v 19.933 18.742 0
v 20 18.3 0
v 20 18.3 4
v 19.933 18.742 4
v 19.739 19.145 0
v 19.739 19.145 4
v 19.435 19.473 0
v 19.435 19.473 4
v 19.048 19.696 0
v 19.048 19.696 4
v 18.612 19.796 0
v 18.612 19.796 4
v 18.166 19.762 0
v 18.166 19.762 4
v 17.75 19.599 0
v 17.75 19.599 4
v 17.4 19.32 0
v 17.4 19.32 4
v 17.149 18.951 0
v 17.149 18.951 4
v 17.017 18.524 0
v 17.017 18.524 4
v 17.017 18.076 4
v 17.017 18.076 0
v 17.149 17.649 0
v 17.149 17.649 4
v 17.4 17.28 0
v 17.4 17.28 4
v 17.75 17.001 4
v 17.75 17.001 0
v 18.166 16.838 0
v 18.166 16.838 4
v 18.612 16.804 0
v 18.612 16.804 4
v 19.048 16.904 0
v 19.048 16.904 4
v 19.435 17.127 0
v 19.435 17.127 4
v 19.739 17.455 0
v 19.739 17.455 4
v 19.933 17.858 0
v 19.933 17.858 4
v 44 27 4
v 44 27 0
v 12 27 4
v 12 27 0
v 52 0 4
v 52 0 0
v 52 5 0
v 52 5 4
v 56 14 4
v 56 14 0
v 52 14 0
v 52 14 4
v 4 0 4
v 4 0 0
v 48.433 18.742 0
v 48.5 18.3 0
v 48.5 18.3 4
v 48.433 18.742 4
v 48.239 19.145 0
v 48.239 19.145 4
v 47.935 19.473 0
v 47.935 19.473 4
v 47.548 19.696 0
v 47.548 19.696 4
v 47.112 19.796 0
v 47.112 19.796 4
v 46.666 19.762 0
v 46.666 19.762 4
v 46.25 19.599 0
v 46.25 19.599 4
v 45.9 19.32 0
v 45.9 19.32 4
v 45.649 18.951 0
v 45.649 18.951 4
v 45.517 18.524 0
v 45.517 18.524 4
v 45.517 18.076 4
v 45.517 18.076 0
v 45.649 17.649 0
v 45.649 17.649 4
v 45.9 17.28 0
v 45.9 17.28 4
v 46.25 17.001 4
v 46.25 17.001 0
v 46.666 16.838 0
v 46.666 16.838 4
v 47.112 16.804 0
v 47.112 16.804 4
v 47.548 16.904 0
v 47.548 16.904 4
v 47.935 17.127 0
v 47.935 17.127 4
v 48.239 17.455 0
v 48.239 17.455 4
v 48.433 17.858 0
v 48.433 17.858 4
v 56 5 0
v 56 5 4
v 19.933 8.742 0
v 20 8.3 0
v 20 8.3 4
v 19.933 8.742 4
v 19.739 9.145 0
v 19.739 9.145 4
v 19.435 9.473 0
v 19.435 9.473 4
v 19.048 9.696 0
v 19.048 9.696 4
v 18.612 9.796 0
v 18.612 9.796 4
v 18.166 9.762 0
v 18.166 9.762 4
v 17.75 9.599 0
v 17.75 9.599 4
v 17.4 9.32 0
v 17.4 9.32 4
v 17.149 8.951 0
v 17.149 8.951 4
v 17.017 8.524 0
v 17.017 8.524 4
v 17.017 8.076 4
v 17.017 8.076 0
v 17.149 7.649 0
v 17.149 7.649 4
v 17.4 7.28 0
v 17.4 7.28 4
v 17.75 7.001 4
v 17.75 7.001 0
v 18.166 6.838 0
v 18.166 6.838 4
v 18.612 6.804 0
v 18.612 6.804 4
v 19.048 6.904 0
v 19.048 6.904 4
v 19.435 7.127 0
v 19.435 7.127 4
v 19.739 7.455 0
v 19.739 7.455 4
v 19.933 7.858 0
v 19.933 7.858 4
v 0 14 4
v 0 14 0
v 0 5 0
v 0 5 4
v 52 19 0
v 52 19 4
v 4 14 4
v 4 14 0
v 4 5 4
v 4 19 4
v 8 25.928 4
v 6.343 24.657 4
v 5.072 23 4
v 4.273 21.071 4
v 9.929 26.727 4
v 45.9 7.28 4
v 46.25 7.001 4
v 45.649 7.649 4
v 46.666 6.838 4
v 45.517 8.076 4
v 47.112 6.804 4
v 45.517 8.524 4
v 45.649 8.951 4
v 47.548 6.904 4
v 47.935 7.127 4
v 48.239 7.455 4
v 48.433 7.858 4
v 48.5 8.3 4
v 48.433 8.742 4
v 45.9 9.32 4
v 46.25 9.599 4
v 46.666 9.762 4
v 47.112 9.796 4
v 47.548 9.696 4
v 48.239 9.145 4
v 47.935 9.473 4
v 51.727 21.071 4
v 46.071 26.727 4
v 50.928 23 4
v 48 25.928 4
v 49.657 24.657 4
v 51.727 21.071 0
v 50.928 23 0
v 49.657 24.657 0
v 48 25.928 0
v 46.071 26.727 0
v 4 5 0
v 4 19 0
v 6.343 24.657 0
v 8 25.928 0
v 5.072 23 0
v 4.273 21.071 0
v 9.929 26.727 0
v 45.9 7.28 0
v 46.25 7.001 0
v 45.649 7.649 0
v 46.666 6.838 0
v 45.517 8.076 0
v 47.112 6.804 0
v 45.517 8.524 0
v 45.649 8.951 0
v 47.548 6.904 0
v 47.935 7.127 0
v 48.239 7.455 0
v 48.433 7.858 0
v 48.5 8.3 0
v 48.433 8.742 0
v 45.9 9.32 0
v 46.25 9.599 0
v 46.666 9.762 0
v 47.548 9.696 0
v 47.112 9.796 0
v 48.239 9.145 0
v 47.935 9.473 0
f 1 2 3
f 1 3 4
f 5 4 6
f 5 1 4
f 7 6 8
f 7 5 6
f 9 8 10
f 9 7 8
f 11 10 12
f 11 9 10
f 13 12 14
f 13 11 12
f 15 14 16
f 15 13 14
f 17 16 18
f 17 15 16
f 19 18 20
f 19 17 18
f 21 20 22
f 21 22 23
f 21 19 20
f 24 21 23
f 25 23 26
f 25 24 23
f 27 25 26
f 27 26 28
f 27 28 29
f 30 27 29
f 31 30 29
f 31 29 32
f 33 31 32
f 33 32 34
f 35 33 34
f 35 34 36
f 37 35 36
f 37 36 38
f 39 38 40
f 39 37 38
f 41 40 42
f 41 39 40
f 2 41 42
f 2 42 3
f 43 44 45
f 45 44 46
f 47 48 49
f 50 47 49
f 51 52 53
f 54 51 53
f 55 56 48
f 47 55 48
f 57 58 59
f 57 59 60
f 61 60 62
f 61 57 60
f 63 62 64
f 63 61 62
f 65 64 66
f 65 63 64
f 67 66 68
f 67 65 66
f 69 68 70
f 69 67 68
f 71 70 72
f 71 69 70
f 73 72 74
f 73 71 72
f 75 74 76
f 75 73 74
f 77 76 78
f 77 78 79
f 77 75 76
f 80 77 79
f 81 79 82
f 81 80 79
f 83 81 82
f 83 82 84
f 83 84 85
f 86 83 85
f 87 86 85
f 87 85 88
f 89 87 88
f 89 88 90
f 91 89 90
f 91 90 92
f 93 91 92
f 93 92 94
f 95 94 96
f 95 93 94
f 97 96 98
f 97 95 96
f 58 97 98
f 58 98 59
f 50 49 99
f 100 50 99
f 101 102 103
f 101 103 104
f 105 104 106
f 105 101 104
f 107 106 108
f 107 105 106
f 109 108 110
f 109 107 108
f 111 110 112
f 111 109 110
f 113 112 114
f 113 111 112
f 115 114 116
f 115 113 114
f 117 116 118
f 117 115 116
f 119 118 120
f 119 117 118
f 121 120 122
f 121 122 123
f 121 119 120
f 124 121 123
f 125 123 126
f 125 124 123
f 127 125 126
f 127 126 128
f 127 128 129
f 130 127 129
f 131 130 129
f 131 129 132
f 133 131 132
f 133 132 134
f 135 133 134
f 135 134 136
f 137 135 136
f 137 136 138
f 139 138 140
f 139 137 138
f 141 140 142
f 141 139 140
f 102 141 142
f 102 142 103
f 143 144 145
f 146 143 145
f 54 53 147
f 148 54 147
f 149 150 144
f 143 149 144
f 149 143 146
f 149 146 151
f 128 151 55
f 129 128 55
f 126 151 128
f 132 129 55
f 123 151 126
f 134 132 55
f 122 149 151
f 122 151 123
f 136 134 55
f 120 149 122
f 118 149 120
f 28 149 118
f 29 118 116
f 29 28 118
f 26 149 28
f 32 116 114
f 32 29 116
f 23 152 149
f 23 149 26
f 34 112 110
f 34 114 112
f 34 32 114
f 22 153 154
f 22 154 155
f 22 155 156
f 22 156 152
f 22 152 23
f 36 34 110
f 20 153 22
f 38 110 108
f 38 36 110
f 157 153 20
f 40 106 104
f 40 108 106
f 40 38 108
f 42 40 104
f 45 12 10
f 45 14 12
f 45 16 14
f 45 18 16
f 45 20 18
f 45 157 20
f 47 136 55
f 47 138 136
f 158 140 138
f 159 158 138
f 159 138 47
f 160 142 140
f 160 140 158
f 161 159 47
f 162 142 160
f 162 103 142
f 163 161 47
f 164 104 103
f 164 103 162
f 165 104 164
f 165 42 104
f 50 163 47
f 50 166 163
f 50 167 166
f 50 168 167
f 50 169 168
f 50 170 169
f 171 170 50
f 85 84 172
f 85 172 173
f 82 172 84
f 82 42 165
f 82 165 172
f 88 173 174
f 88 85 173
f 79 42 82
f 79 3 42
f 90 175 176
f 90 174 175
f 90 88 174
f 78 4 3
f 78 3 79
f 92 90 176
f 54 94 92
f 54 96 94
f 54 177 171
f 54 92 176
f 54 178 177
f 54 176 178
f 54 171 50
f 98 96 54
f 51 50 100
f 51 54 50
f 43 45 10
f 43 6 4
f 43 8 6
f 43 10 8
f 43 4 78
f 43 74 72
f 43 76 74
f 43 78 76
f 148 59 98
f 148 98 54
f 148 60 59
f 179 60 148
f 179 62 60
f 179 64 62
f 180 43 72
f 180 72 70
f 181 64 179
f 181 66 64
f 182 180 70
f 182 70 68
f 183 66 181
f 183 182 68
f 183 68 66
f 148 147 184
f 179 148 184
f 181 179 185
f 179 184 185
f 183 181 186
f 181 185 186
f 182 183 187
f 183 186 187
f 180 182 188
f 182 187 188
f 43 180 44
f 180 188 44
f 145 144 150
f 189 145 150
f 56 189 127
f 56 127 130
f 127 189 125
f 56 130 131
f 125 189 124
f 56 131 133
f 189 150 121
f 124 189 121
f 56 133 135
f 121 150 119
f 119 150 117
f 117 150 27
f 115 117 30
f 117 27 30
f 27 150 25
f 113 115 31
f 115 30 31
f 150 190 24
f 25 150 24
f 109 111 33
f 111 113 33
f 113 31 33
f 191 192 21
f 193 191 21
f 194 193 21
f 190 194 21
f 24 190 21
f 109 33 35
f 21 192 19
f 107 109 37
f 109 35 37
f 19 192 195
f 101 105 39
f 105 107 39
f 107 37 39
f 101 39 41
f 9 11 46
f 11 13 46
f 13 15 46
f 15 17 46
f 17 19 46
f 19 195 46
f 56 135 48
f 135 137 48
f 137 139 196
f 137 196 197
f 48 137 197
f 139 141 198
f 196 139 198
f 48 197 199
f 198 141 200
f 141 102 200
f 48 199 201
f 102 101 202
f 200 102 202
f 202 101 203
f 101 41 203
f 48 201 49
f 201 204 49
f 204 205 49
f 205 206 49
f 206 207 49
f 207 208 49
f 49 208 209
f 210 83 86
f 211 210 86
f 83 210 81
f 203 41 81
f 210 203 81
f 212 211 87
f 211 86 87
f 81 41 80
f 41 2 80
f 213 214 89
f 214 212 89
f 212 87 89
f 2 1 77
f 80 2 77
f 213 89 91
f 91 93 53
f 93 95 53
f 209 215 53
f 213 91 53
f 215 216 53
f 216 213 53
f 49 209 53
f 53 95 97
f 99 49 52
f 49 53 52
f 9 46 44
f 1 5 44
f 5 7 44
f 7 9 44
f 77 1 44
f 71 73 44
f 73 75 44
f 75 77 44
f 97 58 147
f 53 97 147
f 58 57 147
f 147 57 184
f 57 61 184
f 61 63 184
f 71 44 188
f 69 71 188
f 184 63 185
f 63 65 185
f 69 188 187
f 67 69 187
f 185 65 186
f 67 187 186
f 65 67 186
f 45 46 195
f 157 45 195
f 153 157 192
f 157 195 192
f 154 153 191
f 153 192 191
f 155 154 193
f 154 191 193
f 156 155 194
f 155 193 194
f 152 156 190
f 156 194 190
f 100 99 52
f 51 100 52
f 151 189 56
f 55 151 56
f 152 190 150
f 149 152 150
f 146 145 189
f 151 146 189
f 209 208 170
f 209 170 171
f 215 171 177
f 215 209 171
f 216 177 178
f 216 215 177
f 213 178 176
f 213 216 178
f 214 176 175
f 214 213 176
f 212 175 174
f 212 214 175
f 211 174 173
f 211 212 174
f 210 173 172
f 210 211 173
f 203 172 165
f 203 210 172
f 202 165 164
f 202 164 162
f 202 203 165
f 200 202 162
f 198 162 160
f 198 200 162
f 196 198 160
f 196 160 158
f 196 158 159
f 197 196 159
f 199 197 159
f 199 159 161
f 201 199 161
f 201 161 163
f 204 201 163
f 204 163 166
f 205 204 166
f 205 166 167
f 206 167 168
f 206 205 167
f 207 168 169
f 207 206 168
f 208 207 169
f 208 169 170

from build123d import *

# Parameters (mm, degrees)
SKETCH1_R           = 1.5
BOSS_EXTRUDE1_DEPTH = 4


with BuildPart() as part:
    # Sketch1 → Boss-Extrude1 (new body)
    with BuildSketch(Plane.XY):
        with BuildLine():
            Line((3.999999567, 13.999999851), (-4.33e-07, 13.999999851))
            Line((-4.33e-07, 13.999999851), (-4.33e-07, 4.999999851))
            Line((-4.33e-07, 4.999999851), (3.999999567, 4.999999851))
            Line((3.999999567, 4.999999851), (3.999999567, -1.49e-07))
            Line((3.999999567, -1.49e-07), (51.999999567, -1.49e-07))
            Line((51.999999567, -1.49e-07), (51.999999567, 4.999999851))
            Line((51.999999567, 4.999999851), (55.999999567, 4.999999851))
            Line((55.999999567, 4.999999851), (55.999999567, 13.999999851))
            Line((55.999999567, 13.999999851), (51.999999567, 13.999999851))
            Line((51.999999567, 13.999999851), (51.999999567, 18.999999851))
            ThreePointArc((51.999999567, 18.999999851), (49.656853817, 24.6568541), (43.999999567, 26.999999851))
            Line((43.999999567, 26.999999851), (11.999999567, 26.999999851))
            ThreePointArc((11.999999567, 26.999999851), (6.343145318, 24.6568541), (3.999999567, 18.999999851))
            Line((3.999999567, 18.999999851), (3.999999567, 13.999999851))
        make_face()
        with Locations((46.999999567, 18.299999851)):
            Circle(SKETCH1_R, mode=Mode.SUBTRACT)
        with Locations((46.999999567, 8.299999851)):
            Circle(SKETCH1_R, mode=Mode.SUBTRACT)
        with Locations((18.499999567, 18.299999851)):
            Circle(SKETCH1_R, mode=Mode.SUBTRACT)
        with Locations((18.499999567, 8.299999851)):
            Circle(SKETCH1_R, mode=Mode.SUBTRACT)
    extrude(amount=BOSS_EXTRUDE1_DEPTH)


solid = part.part
